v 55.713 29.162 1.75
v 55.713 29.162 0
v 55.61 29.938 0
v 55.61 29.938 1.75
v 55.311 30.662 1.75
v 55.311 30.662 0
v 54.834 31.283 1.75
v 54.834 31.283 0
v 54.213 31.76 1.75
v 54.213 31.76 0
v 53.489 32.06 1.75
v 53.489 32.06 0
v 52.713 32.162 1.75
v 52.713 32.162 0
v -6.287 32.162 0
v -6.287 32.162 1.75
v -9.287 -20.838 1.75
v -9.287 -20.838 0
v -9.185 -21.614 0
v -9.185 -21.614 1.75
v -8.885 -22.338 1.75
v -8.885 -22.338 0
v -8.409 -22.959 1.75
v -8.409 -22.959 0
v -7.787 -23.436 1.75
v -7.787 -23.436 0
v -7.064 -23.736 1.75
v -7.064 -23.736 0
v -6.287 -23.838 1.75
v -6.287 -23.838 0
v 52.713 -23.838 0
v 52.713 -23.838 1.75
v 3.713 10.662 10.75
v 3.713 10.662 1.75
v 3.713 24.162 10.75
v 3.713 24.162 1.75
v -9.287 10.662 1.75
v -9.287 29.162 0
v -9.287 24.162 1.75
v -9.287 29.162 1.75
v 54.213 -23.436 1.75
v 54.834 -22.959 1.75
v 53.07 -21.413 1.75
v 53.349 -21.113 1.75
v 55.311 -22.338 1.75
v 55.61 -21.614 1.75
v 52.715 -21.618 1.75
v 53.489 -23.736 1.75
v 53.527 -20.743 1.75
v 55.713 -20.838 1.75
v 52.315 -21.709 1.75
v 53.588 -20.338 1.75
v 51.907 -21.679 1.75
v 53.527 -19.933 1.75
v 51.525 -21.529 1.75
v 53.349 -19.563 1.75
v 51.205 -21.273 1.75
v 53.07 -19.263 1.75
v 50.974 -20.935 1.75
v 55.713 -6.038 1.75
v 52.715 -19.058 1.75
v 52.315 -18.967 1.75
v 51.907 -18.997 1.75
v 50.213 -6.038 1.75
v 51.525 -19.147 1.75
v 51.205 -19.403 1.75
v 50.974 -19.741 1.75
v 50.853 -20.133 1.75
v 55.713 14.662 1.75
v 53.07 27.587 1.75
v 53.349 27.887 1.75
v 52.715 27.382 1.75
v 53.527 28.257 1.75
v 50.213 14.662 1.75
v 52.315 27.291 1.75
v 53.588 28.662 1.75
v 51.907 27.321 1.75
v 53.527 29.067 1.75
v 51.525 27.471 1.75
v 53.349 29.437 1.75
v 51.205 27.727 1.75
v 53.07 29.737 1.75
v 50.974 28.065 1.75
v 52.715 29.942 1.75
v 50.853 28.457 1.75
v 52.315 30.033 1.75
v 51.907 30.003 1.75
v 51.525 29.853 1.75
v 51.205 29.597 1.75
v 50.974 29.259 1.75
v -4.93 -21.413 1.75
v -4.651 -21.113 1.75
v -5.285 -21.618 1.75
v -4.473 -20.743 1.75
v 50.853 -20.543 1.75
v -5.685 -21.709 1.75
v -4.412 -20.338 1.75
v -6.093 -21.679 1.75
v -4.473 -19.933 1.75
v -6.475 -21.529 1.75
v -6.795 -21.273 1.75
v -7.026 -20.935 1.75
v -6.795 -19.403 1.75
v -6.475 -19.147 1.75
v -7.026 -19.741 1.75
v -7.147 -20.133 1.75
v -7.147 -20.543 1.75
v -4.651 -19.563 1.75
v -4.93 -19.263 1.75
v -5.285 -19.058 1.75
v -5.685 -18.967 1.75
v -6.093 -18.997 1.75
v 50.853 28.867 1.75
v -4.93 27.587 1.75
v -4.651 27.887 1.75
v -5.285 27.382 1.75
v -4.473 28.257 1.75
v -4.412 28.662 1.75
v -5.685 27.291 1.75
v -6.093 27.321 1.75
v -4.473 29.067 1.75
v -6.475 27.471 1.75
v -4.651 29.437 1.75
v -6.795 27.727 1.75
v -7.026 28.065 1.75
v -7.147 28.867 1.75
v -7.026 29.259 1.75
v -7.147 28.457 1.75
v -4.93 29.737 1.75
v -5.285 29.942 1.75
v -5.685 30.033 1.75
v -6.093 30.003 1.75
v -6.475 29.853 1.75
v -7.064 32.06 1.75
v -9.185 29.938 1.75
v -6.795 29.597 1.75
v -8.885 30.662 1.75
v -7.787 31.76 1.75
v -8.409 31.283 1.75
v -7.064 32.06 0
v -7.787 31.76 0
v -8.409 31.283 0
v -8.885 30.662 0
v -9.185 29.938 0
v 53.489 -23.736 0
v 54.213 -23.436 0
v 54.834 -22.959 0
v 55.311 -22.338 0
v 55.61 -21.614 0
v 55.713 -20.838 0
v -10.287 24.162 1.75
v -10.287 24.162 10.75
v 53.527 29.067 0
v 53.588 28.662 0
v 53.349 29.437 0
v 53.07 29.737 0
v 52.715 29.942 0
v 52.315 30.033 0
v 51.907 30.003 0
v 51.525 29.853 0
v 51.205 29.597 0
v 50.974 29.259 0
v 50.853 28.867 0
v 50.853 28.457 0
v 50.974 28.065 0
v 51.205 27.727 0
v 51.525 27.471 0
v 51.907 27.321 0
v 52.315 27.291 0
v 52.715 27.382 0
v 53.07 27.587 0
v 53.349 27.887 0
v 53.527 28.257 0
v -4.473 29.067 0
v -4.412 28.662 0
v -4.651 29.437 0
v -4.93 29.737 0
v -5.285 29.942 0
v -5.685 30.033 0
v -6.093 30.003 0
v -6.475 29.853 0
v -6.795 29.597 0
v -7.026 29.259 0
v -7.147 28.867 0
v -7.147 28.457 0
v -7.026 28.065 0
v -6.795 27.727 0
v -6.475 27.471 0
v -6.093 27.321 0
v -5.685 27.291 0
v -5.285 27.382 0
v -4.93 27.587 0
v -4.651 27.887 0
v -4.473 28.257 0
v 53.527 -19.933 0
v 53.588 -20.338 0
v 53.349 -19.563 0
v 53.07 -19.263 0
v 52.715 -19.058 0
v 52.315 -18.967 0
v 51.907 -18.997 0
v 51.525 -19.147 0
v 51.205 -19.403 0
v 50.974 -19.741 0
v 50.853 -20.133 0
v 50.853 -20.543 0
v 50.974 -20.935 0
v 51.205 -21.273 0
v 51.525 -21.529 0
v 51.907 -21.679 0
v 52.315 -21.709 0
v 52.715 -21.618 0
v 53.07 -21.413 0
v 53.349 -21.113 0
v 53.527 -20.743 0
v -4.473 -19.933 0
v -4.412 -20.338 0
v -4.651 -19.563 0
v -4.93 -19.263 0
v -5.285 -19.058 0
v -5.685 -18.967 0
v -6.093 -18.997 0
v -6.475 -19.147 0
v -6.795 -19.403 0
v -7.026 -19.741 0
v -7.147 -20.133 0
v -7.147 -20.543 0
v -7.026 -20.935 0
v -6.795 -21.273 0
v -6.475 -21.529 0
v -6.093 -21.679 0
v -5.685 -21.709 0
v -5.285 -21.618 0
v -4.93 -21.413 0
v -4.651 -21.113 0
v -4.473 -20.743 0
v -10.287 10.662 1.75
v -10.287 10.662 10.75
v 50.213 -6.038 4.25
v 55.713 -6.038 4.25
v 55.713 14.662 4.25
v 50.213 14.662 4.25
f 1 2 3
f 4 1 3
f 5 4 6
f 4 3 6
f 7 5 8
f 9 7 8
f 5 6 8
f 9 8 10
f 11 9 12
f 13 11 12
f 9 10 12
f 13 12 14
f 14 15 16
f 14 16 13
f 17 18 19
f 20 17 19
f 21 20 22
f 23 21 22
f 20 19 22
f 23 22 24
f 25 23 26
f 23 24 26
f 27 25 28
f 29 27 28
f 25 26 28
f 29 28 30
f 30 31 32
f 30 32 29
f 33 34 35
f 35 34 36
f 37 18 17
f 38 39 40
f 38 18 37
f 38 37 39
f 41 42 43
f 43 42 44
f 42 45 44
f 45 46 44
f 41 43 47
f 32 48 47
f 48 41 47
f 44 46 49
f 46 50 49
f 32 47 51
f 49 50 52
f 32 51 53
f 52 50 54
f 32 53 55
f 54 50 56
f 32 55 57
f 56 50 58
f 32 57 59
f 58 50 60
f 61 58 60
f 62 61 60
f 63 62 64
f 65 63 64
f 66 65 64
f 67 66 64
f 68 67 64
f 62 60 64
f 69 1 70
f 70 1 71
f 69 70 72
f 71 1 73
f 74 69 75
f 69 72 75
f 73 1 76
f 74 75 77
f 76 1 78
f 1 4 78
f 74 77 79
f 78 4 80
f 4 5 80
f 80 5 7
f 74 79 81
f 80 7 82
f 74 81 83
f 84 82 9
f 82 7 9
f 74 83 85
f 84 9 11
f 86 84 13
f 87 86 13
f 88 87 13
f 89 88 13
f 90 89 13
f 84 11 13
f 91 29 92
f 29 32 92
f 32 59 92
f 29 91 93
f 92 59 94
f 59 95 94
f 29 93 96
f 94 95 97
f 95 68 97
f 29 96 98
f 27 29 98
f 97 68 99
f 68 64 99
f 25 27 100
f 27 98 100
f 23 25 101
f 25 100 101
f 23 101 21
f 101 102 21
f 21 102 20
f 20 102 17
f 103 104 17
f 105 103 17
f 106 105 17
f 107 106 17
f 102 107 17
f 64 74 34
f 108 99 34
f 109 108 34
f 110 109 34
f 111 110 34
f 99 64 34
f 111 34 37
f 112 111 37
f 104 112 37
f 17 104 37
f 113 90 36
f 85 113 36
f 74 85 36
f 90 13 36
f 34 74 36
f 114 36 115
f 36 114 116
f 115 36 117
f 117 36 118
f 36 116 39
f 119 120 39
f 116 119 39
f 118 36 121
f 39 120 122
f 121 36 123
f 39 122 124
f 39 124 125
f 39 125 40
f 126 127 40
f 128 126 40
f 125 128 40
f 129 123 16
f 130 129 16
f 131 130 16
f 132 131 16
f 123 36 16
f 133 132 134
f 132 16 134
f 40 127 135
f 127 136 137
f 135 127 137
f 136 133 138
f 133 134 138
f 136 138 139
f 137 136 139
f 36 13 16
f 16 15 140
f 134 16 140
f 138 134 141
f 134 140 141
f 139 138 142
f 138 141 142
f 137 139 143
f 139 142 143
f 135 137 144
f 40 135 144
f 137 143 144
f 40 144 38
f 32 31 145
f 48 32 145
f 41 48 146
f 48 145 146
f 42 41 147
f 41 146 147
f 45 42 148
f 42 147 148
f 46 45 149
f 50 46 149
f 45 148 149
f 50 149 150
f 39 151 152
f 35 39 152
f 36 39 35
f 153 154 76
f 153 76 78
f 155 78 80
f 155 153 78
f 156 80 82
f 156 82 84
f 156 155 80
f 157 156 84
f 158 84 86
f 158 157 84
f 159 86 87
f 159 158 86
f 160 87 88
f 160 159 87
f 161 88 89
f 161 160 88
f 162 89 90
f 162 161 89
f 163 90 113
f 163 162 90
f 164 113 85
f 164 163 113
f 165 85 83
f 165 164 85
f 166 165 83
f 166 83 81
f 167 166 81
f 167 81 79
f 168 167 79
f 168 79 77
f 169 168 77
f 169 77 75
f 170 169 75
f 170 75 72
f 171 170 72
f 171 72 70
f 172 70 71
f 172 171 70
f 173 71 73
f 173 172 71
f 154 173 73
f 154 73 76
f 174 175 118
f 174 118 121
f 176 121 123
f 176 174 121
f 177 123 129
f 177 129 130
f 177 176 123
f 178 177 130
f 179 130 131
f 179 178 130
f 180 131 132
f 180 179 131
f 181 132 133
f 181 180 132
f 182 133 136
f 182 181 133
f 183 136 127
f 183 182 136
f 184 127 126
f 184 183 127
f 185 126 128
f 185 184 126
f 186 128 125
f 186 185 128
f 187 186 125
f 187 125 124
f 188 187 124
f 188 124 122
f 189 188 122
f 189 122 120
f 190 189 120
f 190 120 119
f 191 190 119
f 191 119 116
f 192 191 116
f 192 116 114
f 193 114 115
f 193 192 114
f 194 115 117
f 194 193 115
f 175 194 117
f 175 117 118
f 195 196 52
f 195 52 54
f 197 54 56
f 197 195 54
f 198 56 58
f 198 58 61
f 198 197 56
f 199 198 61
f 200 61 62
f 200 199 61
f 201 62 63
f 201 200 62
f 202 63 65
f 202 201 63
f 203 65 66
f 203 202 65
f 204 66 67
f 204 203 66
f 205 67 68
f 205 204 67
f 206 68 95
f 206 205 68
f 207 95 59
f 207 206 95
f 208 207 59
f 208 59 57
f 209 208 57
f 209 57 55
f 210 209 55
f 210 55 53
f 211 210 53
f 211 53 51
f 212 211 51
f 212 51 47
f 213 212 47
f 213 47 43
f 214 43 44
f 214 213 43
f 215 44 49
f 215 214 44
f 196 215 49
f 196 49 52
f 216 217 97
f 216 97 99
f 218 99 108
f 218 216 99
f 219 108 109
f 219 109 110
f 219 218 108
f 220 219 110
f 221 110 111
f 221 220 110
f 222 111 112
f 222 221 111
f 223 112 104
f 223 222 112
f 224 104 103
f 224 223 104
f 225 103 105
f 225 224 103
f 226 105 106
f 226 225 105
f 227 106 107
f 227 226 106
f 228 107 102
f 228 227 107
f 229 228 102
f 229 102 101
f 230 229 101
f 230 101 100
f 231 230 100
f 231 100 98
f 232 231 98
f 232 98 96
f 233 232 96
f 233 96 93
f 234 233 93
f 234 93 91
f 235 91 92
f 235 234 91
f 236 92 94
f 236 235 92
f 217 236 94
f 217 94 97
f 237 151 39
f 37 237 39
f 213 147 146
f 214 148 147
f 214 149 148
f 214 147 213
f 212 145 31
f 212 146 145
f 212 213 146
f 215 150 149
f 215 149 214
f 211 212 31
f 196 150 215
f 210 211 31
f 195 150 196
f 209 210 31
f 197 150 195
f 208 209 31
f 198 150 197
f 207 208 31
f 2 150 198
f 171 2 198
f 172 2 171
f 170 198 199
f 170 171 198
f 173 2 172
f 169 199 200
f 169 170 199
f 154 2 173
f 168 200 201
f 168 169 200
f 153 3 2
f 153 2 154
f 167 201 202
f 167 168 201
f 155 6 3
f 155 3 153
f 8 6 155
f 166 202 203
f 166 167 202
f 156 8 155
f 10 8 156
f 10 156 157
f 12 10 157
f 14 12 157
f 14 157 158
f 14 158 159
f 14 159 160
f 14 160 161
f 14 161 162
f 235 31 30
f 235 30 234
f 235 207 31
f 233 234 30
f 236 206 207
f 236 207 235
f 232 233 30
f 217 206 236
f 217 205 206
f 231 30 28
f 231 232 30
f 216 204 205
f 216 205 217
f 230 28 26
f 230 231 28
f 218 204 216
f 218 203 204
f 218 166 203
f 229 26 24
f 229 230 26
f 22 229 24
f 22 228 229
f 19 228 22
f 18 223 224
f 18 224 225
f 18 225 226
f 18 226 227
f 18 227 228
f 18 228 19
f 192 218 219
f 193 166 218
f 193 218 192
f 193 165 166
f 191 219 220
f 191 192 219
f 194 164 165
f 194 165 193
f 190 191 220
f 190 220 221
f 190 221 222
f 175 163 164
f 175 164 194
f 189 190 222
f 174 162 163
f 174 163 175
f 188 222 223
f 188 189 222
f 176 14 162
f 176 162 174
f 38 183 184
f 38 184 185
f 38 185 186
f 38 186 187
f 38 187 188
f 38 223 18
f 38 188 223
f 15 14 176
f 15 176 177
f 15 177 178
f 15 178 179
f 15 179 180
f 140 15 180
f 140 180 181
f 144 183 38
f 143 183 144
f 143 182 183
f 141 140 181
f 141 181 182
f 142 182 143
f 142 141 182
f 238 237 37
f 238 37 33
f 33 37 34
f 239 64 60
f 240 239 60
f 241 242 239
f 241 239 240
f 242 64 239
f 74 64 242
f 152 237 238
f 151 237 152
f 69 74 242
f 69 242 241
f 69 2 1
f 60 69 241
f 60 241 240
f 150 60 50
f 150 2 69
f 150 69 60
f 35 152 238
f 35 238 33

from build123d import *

# Parameters (mm, degrees)
SKETCH003_W  = 5.5
SKETCH003_H  = 20.7
PAD002_DEPTH = 2.5
SKETCH_W     = 14
SKETCH_H     = 13.5
PAD001_DEPTH = 9
SKETCH002_R  = 1.375
PAD_DEPTH    = 1.75


with BuildPart() as displayport:
    # Sketch003 (on Face1 of ShapeBinder001) → Pad002 (new body)
    with BuildSketch(Plane.XY.offset(1.75)):
        with Locations((52.9627, 4.312003)):
            Rectangle(SKETCH003_W, SKETCH003_H)
    extrude(amount=PAD002_DEPTH)


with BuildPart() as usb:
    # Sketch (on Face1 of ShapeBinder) → Pad001 (new body)
    with BuildSketch(Plane.XY.offset(1.75)):
        with Locations((-3.2873, 17.412003)):
            Rectangle(SKETCH_W, SKETCH_H)
    extrude(amount=PAD001_DEPTH)


with BuildPart() as fusion001:
    # Sketch002 → Pad (new body)
    with BuildSketch(Plane.XY):
        with BuildLine():
            Line((-6.2873, 32.162003), (52.7127, 32.162003))
            ThreePointArc((55.7127, 29.162003), (54.83402, 31.283323), (52.7127, 32.162003))
            Line((55.7127, 29.162003), (55.7127, -20.837997))
            ThreePointArc((52.7127, -23.837997), (54.83402, -22.959317), (55.7127, -20.837997))
            Line((52.7127, -23.837997), (-6.2873, -23.837997))
            ThreePointArc((-9.2873, -20.837997), (-8.40862, -22.959317), (-6.2873, -23.837997))
            Line((-9.2873, -20.837997), (-9.2873, 29.162003))
            ThreePointArc((-6.2873, 32.162003), (-8.40862, 31.283323), (-9.2873, 29.162003))
        make_face()
        with Locations((-5.7873, 28.662003)):
            Circle(SKETCH002_R, mode=Mode.SUBTRACT)
        with Locations((-5.7873, -20.337997)):
            Circle(SKETCH002_R, mode=Mode.SUBTRACT)
        with Locations((52.2127, -20.337997)):
            Circle(SKETCH002_R, mode=Mode.SUBTRACT)
        with Locations((52.2127, 28.662003)):
            Circle(SKETCH002_R, mode=Mode.SUBTRACT)
    extrude(amount=PAD_DEPTH)

    # Fusion: union usb
    add(usb.part)

    # Fusion001: union displayport
    add(displayport.part)


solid = fusion001.part
